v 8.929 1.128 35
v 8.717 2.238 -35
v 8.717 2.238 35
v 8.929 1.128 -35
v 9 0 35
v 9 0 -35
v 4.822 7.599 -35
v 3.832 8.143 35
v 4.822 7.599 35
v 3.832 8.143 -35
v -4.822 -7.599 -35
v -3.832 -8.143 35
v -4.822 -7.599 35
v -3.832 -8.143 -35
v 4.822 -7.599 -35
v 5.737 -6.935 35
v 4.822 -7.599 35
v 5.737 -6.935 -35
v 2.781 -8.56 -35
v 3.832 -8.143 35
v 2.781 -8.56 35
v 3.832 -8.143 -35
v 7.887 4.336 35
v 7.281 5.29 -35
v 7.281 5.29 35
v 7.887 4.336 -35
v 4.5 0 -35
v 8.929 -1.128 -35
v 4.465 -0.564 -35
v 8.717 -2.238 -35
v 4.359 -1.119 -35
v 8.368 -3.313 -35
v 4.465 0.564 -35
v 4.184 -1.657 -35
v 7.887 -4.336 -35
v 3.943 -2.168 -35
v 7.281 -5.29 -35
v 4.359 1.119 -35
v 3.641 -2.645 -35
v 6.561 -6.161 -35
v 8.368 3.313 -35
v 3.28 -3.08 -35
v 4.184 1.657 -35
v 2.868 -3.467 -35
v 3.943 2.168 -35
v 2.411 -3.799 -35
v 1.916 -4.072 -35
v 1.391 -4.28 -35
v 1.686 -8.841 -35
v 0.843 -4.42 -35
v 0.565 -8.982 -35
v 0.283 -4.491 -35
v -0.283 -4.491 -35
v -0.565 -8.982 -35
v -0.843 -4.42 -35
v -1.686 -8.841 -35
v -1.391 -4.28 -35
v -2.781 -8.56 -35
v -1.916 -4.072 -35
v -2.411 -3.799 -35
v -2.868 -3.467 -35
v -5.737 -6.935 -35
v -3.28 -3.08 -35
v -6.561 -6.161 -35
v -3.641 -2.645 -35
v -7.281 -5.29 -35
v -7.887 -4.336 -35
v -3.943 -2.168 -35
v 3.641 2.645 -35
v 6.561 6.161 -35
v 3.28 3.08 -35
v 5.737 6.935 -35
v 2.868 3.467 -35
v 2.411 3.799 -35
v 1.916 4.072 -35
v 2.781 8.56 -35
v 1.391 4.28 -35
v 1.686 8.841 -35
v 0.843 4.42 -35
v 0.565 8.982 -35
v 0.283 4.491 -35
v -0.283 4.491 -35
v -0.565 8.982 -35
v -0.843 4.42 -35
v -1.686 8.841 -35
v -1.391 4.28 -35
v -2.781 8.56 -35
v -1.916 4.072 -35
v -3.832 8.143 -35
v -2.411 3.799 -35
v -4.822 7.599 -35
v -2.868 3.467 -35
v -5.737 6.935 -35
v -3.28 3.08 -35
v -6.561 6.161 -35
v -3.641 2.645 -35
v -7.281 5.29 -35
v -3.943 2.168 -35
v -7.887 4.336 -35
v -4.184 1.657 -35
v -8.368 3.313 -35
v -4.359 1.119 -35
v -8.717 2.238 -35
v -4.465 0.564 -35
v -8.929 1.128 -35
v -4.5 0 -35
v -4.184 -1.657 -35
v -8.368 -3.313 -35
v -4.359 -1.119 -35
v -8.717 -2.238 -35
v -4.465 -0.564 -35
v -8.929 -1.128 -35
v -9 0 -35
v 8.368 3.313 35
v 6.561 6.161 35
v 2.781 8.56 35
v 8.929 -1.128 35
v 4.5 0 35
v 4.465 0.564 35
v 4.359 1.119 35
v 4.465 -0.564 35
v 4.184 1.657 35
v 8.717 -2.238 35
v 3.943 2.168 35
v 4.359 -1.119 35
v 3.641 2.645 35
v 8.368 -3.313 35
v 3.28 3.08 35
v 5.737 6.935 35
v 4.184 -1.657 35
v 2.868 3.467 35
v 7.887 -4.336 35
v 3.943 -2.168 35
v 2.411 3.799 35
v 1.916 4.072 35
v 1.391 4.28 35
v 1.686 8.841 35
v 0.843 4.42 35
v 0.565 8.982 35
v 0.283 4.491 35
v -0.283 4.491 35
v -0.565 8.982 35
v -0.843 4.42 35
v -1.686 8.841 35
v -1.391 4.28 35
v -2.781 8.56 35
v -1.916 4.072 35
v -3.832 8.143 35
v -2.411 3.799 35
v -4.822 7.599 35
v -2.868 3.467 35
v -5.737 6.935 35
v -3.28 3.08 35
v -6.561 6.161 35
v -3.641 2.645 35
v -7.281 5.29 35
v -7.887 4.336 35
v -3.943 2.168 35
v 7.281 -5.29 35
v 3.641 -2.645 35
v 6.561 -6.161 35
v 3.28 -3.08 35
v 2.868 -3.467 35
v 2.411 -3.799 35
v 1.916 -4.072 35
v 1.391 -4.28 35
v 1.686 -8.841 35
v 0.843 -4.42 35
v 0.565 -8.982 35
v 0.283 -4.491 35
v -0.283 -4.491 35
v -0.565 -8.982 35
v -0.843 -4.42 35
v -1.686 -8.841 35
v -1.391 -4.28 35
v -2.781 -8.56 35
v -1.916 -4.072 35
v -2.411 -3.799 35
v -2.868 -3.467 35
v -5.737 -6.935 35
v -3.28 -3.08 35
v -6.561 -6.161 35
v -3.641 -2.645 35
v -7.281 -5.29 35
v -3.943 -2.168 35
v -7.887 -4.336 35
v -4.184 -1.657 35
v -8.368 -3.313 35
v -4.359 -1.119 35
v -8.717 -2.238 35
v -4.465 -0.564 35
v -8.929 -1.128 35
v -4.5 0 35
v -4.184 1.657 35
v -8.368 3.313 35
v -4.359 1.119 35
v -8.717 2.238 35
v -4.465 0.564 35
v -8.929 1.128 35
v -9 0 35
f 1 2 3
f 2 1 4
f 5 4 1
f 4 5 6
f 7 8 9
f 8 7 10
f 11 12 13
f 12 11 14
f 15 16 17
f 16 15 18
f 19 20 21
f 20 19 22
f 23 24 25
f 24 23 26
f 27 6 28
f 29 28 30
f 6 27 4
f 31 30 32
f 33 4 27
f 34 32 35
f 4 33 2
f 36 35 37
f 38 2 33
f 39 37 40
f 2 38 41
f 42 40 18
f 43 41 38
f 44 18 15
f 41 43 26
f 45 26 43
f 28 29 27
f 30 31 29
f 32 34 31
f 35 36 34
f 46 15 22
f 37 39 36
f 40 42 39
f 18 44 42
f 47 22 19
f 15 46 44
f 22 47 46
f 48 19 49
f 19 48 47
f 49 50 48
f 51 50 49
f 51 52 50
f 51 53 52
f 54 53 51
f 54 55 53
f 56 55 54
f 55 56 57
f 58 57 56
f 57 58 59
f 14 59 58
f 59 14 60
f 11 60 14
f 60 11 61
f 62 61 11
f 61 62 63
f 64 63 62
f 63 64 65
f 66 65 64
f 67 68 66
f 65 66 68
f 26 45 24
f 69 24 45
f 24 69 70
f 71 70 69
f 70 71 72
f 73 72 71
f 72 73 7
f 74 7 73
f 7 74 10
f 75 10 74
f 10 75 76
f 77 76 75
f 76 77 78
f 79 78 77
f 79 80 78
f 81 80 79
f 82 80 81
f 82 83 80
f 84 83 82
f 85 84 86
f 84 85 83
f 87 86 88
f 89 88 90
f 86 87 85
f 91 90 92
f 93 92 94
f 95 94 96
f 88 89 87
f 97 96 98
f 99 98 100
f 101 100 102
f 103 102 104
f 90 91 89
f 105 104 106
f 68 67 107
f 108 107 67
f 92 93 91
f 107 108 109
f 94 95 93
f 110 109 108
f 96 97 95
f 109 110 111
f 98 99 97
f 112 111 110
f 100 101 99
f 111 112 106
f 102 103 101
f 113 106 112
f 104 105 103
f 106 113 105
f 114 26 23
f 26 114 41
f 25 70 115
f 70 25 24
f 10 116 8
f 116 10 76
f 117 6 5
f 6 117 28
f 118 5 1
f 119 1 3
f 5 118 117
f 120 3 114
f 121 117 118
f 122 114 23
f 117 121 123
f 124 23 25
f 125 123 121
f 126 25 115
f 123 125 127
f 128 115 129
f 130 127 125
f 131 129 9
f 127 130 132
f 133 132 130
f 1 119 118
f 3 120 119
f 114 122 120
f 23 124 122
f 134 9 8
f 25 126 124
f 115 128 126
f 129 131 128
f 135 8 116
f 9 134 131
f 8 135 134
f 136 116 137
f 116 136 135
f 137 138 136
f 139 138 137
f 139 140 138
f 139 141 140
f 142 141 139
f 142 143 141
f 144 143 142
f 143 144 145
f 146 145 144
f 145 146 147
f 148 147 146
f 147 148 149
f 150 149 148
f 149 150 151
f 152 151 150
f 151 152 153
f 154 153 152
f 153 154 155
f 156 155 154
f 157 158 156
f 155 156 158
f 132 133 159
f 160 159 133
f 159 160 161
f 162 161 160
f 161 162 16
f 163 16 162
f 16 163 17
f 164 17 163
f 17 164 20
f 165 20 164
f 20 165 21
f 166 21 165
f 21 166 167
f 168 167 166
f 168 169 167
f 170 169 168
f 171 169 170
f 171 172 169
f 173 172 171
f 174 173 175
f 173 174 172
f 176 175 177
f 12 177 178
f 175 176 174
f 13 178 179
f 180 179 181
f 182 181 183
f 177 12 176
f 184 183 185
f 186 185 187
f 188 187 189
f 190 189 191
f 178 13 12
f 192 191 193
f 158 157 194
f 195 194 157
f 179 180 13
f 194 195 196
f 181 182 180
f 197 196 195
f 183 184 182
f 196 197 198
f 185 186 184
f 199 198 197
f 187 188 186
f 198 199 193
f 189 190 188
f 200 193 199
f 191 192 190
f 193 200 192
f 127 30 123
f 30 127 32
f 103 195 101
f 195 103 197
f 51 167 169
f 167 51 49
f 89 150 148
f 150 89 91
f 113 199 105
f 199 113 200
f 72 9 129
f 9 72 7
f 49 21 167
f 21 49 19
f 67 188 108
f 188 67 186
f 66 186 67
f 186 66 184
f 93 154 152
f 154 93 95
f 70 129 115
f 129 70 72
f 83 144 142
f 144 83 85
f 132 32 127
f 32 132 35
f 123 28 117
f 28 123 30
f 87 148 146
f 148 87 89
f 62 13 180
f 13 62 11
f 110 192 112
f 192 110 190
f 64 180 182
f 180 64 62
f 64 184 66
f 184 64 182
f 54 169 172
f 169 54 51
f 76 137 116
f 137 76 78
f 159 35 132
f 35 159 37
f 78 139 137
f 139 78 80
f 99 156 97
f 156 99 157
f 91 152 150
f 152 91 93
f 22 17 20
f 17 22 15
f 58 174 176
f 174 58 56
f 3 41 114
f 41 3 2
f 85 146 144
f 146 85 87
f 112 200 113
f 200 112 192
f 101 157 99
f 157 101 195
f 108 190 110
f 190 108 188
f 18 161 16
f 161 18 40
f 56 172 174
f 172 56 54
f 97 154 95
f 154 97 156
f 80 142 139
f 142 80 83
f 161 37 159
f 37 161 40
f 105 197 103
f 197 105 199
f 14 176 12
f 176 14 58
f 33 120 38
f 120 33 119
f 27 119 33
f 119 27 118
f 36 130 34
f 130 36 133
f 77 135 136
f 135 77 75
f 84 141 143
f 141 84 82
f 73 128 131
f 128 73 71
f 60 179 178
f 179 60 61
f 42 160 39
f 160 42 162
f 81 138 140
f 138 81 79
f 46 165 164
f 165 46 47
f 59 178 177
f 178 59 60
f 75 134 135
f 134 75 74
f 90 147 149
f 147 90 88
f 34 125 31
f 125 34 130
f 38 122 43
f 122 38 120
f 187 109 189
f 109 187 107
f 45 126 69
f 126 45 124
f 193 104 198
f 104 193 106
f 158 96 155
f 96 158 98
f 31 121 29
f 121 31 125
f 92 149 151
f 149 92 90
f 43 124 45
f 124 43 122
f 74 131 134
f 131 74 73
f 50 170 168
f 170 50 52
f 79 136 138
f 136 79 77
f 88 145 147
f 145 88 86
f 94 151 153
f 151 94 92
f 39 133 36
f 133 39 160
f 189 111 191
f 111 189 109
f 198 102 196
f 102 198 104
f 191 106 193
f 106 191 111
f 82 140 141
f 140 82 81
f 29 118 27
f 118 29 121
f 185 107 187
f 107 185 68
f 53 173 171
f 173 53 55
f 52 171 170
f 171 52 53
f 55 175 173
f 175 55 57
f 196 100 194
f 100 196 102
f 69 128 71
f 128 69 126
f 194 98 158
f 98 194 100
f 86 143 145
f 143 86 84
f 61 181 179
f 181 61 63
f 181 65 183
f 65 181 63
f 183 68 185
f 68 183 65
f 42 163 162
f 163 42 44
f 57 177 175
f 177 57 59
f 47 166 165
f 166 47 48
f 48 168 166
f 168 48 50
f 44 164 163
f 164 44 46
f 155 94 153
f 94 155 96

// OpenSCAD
$fn = 50;


difference() {
	union() {
		translate(v = [0, 0, -35.0000000000]) {
			cylinder(h = 70, r = 9.0000000000);
		}
	}
	union() {
		translate(v = [0, 0, -100.0000000000]) {
			cylinder(h = 200, r = 4.5000000000);
		}
	}
}
